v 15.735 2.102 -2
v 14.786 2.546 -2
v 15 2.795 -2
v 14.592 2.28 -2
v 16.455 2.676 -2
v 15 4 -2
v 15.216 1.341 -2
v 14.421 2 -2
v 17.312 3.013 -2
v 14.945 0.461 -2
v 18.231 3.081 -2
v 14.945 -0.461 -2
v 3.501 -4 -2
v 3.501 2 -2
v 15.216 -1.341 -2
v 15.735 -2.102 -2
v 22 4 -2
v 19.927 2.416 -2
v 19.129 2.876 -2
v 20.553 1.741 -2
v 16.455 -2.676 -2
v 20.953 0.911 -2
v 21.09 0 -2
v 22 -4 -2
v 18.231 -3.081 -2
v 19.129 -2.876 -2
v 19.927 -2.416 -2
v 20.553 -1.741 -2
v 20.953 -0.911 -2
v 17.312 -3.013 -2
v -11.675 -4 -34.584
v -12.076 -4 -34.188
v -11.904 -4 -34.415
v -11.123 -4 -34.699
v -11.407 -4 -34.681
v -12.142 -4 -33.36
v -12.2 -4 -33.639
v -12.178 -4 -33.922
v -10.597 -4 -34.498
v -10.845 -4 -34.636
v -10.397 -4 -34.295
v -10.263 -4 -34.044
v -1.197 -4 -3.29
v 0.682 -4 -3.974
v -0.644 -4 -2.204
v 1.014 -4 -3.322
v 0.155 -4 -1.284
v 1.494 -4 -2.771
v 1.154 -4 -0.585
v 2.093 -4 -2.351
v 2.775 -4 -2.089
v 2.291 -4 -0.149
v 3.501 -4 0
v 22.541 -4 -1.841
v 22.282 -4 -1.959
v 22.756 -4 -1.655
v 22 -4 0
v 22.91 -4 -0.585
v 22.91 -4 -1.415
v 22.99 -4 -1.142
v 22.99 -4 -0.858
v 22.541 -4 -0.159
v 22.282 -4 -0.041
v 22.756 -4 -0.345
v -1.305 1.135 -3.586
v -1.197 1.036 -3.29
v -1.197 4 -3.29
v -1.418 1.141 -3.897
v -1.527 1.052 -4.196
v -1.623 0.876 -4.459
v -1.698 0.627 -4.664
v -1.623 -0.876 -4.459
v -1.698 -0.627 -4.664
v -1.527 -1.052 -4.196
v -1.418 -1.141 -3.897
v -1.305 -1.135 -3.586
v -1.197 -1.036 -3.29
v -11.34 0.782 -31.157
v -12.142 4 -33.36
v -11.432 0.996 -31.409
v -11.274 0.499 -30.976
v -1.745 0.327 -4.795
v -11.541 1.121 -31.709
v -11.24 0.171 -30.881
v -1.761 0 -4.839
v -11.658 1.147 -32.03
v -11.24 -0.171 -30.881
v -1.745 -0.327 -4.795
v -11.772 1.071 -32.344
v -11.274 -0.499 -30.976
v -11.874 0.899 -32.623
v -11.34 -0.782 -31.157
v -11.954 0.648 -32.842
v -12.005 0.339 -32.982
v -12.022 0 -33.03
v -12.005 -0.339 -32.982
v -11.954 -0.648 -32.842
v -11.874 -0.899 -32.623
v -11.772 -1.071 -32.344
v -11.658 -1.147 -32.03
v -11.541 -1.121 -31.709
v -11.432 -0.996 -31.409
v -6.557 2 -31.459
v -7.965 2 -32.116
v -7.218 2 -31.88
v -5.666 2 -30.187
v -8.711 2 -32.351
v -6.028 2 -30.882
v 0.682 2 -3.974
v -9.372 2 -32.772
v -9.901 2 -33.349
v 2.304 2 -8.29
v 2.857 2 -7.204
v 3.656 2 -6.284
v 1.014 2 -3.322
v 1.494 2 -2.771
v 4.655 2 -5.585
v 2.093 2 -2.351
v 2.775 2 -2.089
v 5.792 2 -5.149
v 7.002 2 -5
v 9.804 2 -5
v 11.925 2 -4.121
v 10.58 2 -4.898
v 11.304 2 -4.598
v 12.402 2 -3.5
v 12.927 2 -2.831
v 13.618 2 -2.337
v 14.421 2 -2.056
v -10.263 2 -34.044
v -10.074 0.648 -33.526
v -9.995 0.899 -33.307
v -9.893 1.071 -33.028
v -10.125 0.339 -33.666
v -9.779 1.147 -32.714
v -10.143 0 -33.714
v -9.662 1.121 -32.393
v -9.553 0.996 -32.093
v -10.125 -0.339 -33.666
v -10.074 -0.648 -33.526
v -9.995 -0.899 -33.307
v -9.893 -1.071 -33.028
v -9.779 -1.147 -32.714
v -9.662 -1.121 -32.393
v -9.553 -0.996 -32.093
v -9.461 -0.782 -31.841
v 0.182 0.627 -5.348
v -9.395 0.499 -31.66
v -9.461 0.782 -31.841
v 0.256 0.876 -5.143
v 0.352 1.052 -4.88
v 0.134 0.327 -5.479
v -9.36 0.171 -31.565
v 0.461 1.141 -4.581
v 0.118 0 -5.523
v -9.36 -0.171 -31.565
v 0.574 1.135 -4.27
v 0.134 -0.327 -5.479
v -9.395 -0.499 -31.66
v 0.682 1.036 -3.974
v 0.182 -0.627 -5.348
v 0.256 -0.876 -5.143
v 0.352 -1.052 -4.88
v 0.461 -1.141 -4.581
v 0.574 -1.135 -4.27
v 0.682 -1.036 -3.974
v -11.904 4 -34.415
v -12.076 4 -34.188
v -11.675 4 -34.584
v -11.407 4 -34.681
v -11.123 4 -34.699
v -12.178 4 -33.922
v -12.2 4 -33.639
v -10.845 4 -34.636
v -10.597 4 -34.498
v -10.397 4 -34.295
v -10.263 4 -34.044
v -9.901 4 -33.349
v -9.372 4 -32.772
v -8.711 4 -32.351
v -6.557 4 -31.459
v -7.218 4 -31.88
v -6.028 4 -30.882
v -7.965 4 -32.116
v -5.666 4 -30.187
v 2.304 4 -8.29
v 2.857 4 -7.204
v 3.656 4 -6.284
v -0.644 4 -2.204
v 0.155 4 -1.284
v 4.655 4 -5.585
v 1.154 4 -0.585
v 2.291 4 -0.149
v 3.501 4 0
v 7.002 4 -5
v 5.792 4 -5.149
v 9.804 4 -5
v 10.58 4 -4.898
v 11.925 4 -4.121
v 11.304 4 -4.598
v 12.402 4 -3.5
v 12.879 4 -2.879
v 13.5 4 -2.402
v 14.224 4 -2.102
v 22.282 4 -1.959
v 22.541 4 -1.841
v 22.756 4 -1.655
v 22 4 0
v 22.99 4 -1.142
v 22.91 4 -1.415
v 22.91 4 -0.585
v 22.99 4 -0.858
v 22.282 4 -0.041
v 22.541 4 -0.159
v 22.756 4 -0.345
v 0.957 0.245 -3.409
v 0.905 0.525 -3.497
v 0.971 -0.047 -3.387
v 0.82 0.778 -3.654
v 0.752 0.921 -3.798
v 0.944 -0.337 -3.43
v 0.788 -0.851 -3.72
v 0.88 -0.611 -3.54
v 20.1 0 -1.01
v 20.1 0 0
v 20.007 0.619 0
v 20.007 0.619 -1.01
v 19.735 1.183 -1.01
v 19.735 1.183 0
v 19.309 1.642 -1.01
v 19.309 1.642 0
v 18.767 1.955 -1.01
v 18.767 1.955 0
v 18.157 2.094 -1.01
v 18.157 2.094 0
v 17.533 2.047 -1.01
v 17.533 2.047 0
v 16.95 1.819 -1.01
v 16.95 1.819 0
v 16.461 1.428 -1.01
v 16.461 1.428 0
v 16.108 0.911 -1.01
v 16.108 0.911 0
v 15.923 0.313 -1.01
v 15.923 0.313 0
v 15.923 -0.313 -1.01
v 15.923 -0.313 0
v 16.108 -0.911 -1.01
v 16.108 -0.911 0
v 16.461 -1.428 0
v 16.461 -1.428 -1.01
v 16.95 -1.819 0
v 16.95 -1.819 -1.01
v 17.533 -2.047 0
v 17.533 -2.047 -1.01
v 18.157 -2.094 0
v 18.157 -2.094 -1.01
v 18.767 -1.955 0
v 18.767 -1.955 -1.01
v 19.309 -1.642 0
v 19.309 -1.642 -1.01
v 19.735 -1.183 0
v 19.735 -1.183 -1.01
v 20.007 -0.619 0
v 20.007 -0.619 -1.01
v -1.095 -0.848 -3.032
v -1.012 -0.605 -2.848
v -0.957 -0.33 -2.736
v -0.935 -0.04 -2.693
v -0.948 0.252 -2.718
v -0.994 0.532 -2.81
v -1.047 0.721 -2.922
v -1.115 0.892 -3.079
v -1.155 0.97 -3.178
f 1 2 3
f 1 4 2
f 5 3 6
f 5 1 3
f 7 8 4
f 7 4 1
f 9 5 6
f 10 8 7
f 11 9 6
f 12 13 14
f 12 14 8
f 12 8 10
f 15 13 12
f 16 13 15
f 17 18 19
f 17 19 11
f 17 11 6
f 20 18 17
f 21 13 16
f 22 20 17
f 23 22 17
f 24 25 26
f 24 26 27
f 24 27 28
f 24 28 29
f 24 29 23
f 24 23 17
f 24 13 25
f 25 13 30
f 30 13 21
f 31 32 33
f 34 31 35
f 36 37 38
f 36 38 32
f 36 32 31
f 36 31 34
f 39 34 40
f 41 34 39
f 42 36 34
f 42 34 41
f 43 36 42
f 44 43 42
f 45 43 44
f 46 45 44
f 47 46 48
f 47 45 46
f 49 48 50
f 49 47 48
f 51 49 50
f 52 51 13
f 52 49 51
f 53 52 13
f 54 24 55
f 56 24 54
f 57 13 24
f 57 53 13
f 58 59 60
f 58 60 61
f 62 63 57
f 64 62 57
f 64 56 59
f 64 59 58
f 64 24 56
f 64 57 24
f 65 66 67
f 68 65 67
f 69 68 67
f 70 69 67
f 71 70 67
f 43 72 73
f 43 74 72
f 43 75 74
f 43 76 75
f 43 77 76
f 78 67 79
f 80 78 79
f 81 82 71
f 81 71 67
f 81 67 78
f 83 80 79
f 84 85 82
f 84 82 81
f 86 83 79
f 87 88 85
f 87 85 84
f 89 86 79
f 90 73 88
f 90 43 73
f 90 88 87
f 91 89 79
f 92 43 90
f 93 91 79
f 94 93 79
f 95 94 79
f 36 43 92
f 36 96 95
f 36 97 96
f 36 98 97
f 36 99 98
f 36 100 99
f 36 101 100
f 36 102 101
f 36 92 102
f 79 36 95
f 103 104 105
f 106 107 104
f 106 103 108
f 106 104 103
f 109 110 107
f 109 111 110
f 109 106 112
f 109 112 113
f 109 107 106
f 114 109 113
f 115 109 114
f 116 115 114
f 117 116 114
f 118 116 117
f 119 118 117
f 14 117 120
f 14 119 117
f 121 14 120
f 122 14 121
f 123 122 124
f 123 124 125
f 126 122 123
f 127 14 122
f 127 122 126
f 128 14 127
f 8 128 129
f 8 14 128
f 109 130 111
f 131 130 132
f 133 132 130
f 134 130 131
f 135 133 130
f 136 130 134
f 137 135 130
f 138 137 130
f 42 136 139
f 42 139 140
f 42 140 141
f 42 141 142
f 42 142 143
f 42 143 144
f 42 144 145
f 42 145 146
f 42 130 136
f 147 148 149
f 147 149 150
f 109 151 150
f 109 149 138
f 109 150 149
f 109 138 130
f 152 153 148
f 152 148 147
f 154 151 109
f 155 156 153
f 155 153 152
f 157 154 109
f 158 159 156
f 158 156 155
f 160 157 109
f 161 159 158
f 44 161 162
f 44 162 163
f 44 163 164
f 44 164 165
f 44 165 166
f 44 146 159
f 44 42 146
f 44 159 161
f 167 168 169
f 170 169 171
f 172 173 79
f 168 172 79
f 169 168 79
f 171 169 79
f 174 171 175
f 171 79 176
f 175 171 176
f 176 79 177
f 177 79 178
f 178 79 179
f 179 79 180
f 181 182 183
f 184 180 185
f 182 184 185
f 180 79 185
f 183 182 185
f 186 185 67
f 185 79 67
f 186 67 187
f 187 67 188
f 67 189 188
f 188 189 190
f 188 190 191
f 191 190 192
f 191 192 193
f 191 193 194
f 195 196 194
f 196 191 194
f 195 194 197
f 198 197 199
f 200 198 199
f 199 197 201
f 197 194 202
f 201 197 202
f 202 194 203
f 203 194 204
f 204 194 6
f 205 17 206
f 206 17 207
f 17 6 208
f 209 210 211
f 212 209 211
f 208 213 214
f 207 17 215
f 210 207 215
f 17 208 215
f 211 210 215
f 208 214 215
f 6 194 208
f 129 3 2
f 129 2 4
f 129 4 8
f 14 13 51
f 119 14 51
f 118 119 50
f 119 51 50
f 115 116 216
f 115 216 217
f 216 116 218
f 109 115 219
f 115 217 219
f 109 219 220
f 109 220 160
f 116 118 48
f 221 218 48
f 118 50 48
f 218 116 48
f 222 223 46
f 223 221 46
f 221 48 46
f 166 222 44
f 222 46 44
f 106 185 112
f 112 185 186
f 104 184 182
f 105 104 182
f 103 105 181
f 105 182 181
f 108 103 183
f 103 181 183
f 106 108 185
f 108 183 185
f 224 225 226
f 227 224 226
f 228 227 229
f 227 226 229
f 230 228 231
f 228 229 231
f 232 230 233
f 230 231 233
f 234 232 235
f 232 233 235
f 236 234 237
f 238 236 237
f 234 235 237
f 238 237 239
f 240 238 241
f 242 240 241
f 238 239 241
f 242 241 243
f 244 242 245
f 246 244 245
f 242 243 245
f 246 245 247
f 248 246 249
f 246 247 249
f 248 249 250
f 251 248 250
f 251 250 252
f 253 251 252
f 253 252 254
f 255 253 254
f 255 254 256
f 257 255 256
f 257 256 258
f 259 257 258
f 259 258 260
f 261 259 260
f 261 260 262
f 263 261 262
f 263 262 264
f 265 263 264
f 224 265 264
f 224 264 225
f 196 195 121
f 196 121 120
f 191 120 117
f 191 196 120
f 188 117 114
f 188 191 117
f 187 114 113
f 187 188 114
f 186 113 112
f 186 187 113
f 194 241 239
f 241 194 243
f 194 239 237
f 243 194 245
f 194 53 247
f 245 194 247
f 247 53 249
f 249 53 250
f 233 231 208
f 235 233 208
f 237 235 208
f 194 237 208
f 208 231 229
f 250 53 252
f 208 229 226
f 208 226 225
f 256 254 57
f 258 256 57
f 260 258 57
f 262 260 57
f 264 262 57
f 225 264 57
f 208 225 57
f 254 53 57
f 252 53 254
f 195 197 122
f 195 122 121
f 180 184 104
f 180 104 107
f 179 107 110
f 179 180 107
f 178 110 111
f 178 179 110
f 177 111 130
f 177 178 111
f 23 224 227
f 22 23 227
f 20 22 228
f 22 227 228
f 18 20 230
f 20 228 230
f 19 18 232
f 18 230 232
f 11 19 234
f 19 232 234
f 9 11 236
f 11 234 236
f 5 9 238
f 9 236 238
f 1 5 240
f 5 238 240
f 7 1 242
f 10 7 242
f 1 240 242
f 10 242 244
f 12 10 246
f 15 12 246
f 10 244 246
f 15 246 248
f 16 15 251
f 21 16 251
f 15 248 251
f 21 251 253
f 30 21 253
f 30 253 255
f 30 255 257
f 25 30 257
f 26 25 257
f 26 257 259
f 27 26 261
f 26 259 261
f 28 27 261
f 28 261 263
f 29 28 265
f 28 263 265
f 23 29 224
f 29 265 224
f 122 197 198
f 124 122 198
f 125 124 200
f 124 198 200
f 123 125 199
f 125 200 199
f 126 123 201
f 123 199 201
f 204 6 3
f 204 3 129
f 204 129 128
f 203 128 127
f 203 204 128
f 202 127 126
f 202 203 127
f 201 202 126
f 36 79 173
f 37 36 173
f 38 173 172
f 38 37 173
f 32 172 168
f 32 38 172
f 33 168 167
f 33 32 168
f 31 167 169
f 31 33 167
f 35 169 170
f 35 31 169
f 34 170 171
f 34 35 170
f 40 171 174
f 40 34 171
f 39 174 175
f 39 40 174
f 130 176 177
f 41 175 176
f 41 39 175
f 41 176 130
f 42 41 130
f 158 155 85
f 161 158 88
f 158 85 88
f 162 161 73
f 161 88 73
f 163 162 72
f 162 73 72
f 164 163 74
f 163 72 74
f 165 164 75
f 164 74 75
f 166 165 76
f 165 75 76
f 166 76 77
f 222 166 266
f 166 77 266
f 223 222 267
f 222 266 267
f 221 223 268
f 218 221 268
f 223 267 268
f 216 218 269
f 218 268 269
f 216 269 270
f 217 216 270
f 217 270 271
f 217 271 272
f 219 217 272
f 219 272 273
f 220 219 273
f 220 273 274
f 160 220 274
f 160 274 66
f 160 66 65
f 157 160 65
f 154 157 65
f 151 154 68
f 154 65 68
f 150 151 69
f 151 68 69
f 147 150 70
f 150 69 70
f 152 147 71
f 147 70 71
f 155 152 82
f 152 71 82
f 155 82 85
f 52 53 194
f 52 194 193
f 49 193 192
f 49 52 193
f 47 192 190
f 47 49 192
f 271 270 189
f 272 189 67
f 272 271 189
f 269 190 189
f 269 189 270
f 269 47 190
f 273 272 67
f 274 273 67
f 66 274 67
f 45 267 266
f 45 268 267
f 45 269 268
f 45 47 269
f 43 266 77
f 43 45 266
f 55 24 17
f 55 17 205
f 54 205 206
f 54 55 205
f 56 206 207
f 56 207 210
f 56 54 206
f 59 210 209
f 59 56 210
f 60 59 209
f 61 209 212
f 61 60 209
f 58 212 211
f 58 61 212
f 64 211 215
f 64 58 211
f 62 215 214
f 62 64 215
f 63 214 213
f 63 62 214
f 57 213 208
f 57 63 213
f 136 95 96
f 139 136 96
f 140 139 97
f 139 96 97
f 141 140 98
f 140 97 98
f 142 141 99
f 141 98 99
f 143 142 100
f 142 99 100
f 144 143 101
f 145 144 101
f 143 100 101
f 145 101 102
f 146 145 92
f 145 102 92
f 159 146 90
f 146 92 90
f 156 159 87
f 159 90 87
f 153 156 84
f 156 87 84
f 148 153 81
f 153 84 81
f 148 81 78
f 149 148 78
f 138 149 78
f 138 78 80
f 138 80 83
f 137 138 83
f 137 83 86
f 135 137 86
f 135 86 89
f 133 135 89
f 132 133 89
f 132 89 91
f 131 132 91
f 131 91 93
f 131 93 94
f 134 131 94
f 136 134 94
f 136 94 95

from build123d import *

# Parameters (mm, degrees)
PAD_DEPTH       = 4
PAD001_DEPTH    = 2
SKETCH004_R     = 4.1
POCKET002_DEPTH = 32.7030832918
SKETCH001_R     = 2.1
POCKET_DEPTH    = 5
SKETCH002_R     = 1.15
POCKET001_DEPTH = 33.4827417793
CHAMFER_SIZE    = 0.99


with BuildPart() as part:
    # Sketch → Pad (new body, symmetric)
    with BuildSketch(Plane.XZ):
        with BuildLine():
            Line((-1.1974254129, -3.2898992834), (-12.1420699993, -33.3600631485))
            ThreePointArc((-12.1420699993, -33.3600631485), (-11.5443975218, -34.6417759126), (-10.2626847577, -34.0441034352))
            Line((-10.2626847577, -34.0441034352), (0.6819598287, -3.97393957))
            ThreePointArc((3.501037691, -2), (1.780308382, -2.5425438671), (0.6819598287, -3.97393957))
            Line((3.501037691, -2), (22, -2))
            ThreePointArc((22, -2), (23, -1), (22, 0))
            Line((3.501037691, 0), (22, 0))
            ThreePointArc((3.501037691, 0), (0.6331555093, -0.9042397786), (-1.1974254129, -3.2898992834))
        make_face()
    extrude(amount=PAD_DEPTH, both=True)

    # Sketch003 → Pad001 (join)
    with BuildSketch(Plane.XZ.offset(-4)):
        with BuildLine():
            Line((-1.1974254129, -3.2898992834), (-12.1420699993, -33.3600631485))
            Line((-12.1420699993, -33.3600631485), (-10.2626847577, -34.0441034352))
            ThreePointArc((-7.9645514284, -32.1157406061), (-9.3719697244, -32.7720305358), (-10.2626847577, -34.0441034352))
            ThreePointArc((-7.9645514284, -32.1157406061), (-6.5571331323, -31.4594506764), (-5.666418099, -30.1873777771))
            Line((-5.666418099, -30.1873777771), (2.3036122782, -8.2898992834))
            ThreePointArc((7.0020753821, -5), (4.1341932003, -5.9042397786), (2.3036122782, -8.2898992834))
            Line((9.8038475773, -5), (7.0020753821, -5))
            ThreePointArc((9.8038475773, -5), (11.3038475773, -4.5980762114), (12.4019237887, -3.5))
            ThreePointArc((15, -2), (13.5, -2.4019237887), (12.4019237887, -3.5))
            Line((15, 0), (15, -2))
            Line((3.501037691, 0), (15, 0))
            ThreePointArc((3.501037691, 0), (0.6331555093, -0.9042397786), (-1.1974254129, -3.2898992834))
        make_face()
    extrude(amount=PAD001_DEPTH)

    # Sketch004 → Pocket002 (cut, through all)
    with BuildSketch(Plane.XY.offset(-2)):
        with Locations((18, 0)):
            Circle(SKETCH004_R)
    extrude(amount=-POCKET002_DEPTH, mode=Mode.SUBTRACT)

    # Sketch001 → Pocket (cut)
    with BuildSketch(Plane.XY):
        with Locations((18, 0)):
            Circle(SKETCH001_R)
    extrude(amount=-POCKET_DEPTH, mode=Mode.SUBTRACT)

    # Sketch002 (on Face2 of Pocket) → Pocket001 (cut, through all)
    with BuildSketch(Plane(origin=(0, 0, 0), x_dir=(-0.3420201433, 0, -0.9396926208), z_dir=(-0.9396926208, 0, 0.3420201433))):
        with Locations((4, 0)):
            Circle(SKETCH002_R)
        with Locations((34, 0)):
            Circle(SKETCH002_R)
    extrude(amount=-POCKET001_DEPTH, mode=Mode.SUBTRACT)

    # Chamfer
    chamfer_edges = [part.edges().sort_by_distance(p)[0] for p in [
        (15.9, 0, -2),
    ]]
    chamfer(chamfer_edges, length=CHAMFER_SIZE)


solid = part.part
